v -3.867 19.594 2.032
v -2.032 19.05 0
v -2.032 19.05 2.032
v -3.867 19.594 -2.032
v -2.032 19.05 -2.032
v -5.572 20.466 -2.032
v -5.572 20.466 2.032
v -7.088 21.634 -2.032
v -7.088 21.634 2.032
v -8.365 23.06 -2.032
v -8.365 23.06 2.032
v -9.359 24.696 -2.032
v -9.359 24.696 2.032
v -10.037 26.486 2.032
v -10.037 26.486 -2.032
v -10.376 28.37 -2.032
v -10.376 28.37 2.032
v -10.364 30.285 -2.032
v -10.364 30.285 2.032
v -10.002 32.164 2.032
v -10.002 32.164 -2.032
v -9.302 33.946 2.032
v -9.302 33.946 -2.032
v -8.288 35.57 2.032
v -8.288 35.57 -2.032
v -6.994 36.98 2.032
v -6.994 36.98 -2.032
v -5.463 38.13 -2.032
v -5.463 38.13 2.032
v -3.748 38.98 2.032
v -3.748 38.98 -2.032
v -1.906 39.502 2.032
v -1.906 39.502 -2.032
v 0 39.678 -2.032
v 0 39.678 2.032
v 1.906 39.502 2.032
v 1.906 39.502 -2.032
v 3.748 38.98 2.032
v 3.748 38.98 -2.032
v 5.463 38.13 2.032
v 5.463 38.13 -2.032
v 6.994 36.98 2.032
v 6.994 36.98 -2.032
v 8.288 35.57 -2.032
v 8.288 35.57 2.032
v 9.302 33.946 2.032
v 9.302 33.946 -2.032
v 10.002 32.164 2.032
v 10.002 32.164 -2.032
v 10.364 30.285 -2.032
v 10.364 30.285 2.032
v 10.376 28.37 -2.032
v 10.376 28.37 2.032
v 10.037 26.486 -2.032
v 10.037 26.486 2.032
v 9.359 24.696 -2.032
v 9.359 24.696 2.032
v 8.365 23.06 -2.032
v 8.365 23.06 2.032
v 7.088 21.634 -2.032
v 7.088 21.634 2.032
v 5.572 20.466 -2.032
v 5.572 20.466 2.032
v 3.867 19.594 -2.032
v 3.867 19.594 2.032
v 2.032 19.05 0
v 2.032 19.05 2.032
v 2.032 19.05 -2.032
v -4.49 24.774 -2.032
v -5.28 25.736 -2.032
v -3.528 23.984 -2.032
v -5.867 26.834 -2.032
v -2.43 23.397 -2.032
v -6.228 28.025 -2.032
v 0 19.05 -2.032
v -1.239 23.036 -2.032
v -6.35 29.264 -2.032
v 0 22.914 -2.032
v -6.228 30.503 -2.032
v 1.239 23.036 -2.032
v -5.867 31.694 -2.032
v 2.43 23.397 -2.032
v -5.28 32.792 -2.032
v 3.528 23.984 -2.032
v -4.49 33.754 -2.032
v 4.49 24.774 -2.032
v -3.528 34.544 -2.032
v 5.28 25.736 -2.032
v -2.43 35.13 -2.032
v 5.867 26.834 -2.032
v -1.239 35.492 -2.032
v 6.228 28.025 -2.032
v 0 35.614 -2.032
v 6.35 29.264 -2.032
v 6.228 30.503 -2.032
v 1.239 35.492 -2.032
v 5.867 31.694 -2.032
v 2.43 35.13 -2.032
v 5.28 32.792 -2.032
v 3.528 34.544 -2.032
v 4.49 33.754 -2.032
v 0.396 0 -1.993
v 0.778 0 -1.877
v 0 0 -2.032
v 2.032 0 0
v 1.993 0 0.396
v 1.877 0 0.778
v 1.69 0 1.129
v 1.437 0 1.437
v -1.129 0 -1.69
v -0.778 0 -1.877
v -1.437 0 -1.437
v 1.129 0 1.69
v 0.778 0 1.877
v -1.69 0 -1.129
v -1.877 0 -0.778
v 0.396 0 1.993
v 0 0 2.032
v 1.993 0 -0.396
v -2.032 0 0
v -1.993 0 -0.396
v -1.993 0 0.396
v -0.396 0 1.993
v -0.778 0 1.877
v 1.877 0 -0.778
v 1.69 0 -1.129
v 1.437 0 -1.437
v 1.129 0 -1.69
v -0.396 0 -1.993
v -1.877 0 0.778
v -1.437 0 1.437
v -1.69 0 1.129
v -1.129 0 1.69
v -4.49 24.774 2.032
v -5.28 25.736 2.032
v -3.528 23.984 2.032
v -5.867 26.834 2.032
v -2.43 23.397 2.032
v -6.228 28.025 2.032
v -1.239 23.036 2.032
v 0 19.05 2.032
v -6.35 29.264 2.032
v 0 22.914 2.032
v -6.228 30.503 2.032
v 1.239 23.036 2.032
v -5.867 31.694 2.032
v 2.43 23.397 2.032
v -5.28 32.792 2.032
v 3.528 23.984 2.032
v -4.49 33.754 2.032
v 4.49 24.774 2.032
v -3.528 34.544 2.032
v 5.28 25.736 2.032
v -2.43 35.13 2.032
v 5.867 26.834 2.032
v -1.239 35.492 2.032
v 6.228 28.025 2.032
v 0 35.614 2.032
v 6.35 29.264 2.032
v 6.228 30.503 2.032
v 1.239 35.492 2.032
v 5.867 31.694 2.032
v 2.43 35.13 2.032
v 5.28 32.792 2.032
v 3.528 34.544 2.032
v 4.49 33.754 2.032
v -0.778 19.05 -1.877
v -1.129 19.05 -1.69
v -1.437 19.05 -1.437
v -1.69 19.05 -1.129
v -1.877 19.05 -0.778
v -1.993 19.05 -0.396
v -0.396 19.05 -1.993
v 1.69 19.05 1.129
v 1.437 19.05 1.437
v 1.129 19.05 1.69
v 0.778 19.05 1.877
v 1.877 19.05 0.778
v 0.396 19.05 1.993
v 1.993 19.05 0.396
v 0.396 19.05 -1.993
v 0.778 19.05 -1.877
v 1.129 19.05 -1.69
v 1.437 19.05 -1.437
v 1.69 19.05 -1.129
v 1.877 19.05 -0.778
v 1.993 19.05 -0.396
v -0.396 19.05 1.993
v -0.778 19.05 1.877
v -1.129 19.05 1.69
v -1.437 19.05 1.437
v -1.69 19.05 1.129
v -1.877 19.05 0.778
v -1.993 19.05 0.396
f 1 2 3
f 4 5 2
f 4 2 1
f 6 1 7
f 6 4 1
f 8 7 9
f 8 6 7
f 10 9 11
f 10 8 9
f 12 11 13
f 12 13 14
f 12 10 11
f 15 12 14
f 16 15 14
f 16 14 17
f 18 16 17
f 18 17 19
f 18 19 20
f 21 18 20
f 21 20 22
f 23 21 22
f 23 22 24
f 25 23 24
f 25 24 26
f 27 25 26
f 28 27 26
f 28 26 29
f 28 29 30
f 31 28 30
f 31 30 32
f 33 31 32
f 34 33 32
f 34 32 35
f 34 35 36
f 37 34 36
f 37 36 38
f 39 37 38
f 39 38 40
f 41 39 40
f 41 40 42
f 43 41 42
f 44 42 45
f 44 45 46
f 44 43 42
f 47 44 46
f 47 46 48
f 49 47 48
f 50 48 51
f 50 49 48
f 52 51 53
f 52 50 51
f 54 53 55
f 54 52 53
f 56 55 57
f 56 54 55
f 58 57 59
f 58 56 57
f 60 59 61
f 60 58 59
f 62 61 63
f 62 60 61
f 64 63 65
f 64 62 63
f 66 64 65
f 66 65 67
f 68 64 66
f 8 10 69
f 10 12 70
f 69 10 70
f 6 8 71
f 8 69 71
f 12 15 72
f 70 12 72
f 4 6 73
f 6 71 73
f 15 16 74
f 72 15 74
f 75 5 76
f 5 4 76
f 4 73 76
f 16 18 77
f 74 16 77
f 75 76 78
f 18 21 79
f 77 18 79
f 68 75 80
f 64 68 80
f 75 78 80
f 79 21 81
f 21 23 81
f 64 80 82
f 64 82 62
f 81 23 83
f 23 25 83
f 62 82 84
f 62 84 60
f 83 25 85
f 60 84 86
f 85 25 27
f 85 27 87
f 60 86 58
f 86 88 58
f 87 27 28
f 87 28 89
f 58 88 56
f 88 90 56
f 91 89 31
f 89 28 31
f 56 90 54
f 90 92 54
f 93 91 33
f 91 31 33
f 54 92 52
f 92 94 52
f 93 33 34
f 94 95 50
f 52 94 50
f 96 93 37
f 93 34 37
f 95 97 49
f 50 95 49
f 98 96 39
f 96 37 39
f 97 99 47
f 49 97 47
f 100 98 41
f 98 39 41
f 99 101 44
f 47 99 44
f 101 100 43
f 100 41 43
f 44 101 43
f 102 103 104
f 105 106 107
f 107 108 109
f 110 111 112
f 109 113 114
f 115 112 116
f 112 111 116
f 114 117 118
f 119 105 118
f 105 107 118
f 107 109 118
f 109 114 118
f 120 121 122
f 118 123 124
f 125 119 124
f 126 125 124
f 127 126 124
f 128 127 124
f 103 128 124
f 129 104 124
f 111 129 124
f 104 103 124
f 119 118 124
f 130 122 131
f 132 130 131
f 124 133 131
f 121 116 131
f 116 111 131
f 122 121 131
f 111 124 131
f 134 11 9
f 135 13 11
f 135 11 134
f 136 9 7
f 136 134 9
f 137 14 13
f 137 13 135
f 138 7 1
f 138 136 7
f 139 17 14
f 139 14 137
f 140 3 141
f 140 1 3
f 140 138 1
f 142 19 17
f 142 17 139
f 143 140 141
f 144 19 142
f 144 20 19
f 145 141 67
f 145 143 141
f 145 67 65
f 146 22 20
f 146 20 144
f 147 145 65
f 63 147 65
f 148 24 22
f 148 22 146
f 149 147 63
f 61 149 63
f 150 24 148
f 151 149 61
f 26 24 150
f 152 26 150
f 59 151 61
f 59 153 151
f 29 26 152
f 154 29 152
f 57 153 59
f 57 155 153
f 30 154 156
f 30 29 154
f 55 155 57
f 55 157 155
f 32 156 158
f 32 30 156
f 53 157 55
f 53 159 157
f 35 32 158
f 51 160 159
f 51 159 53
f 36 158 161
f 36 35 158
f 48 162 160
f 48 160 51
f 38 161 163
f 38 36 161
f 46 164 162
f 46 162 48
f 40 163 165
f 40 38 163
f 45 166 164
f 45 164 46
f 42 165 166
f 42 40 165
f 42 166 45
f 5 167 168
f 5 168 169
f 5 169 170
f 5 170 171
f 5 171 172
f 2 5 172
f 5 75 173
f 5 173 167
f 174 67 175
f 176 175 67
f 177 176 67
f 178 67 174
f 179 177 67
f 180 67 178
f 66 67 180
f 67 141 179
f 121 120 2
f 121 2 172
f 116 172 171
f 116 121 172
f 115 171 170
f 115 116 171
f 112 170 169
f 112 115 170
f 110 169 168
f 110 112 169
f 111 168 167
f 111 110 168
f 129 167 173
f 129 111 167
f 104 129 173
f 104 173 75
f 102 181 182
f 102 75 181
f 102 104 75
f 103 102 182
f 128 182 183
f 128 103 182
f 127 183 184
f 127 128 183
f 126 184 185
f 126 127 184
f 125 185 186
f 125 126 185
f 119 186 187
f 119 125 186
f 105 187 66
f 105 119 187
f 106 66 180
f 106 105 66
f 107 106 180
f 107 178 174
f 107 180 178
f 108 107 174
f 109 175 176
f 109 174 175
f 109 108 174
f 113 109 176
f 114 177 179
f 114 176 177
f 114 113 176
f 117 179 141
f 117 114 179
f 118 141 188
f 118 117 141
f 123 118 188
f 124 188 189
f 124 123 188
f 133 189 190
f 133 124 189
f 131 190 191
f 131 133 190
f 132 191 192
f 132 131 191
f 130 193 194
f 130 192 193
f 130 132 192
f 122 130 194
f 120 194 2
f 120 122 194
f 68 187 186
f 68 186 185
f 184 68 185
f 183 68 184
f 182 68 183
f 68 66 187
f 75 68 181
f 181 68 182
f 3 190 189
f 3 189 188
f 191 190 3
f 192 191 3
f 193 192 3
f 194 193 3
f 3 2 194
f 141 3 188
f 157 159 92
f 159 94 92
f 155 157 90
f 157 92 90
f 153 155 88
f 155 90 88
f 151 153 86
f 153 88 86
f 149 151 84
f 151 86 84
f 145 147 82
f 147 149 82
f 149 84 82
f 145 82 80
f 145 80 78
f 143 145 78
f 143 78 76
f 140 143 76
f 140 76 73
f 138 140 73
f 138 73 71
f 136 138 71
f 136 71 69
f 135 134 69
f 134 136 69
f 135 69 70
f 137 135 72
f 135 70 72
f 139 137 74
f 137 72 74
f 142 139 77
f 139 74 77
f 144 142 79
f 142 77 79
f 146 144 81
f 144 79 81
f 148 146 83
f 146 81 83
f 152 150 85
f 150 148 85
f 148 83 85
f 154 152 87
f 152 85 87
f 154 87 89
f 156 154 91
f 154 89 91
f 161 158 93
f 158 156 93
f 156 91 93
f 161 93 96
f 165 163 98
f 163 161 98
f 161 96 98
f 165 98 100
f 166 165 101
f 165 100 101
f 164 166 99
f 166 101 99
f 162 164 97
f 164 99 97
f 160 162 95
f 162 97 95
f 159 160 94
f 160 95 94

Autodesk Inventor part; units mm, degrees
ref_plane "YZ Plane" through (0, 0, 0) normal (1, 0, 0) x (0, 1, 0)
ref_plane "XZ Plane" through (0, 0, 0) normal (0, 1, 0) x (-1, 0, 0)
ref_plane "XY Plane" through (0, 0, 0) normal (0, 0, 1) x (1, 0, 0)
sketch "Sketch1" plane through (0, 0, 0) normal (0, 1, 0) x (-1, 0, 0)
  circle A0 centre (0, 0) radius 2.032
  dimension "d0" = 4.064
extrude "Extrusion1" add sketch "Sketch1" along normal blind 19.05
sketch "Sketch2" plane through (0, 0, 0) normal (0, 0, 1) x (1, 0, 0)
  circle A0 centre (0, 29.2638) radius 6.35
  line L0 (2.032, 19.05) -> (-2.032, 19.05) projected
  circle A1 centre (0, 29.2638) radius 10.414
  point P0 (0, 0)
  dimension "d3" = 4.064
  dimension "d4" = 12.7
extrude "Extrusion2" add sketch "Sketch2" along normal mid plane 4.064 contours L0 A1 picked at (0.2551, 20.3534)
properties part number "EyeBolt"
